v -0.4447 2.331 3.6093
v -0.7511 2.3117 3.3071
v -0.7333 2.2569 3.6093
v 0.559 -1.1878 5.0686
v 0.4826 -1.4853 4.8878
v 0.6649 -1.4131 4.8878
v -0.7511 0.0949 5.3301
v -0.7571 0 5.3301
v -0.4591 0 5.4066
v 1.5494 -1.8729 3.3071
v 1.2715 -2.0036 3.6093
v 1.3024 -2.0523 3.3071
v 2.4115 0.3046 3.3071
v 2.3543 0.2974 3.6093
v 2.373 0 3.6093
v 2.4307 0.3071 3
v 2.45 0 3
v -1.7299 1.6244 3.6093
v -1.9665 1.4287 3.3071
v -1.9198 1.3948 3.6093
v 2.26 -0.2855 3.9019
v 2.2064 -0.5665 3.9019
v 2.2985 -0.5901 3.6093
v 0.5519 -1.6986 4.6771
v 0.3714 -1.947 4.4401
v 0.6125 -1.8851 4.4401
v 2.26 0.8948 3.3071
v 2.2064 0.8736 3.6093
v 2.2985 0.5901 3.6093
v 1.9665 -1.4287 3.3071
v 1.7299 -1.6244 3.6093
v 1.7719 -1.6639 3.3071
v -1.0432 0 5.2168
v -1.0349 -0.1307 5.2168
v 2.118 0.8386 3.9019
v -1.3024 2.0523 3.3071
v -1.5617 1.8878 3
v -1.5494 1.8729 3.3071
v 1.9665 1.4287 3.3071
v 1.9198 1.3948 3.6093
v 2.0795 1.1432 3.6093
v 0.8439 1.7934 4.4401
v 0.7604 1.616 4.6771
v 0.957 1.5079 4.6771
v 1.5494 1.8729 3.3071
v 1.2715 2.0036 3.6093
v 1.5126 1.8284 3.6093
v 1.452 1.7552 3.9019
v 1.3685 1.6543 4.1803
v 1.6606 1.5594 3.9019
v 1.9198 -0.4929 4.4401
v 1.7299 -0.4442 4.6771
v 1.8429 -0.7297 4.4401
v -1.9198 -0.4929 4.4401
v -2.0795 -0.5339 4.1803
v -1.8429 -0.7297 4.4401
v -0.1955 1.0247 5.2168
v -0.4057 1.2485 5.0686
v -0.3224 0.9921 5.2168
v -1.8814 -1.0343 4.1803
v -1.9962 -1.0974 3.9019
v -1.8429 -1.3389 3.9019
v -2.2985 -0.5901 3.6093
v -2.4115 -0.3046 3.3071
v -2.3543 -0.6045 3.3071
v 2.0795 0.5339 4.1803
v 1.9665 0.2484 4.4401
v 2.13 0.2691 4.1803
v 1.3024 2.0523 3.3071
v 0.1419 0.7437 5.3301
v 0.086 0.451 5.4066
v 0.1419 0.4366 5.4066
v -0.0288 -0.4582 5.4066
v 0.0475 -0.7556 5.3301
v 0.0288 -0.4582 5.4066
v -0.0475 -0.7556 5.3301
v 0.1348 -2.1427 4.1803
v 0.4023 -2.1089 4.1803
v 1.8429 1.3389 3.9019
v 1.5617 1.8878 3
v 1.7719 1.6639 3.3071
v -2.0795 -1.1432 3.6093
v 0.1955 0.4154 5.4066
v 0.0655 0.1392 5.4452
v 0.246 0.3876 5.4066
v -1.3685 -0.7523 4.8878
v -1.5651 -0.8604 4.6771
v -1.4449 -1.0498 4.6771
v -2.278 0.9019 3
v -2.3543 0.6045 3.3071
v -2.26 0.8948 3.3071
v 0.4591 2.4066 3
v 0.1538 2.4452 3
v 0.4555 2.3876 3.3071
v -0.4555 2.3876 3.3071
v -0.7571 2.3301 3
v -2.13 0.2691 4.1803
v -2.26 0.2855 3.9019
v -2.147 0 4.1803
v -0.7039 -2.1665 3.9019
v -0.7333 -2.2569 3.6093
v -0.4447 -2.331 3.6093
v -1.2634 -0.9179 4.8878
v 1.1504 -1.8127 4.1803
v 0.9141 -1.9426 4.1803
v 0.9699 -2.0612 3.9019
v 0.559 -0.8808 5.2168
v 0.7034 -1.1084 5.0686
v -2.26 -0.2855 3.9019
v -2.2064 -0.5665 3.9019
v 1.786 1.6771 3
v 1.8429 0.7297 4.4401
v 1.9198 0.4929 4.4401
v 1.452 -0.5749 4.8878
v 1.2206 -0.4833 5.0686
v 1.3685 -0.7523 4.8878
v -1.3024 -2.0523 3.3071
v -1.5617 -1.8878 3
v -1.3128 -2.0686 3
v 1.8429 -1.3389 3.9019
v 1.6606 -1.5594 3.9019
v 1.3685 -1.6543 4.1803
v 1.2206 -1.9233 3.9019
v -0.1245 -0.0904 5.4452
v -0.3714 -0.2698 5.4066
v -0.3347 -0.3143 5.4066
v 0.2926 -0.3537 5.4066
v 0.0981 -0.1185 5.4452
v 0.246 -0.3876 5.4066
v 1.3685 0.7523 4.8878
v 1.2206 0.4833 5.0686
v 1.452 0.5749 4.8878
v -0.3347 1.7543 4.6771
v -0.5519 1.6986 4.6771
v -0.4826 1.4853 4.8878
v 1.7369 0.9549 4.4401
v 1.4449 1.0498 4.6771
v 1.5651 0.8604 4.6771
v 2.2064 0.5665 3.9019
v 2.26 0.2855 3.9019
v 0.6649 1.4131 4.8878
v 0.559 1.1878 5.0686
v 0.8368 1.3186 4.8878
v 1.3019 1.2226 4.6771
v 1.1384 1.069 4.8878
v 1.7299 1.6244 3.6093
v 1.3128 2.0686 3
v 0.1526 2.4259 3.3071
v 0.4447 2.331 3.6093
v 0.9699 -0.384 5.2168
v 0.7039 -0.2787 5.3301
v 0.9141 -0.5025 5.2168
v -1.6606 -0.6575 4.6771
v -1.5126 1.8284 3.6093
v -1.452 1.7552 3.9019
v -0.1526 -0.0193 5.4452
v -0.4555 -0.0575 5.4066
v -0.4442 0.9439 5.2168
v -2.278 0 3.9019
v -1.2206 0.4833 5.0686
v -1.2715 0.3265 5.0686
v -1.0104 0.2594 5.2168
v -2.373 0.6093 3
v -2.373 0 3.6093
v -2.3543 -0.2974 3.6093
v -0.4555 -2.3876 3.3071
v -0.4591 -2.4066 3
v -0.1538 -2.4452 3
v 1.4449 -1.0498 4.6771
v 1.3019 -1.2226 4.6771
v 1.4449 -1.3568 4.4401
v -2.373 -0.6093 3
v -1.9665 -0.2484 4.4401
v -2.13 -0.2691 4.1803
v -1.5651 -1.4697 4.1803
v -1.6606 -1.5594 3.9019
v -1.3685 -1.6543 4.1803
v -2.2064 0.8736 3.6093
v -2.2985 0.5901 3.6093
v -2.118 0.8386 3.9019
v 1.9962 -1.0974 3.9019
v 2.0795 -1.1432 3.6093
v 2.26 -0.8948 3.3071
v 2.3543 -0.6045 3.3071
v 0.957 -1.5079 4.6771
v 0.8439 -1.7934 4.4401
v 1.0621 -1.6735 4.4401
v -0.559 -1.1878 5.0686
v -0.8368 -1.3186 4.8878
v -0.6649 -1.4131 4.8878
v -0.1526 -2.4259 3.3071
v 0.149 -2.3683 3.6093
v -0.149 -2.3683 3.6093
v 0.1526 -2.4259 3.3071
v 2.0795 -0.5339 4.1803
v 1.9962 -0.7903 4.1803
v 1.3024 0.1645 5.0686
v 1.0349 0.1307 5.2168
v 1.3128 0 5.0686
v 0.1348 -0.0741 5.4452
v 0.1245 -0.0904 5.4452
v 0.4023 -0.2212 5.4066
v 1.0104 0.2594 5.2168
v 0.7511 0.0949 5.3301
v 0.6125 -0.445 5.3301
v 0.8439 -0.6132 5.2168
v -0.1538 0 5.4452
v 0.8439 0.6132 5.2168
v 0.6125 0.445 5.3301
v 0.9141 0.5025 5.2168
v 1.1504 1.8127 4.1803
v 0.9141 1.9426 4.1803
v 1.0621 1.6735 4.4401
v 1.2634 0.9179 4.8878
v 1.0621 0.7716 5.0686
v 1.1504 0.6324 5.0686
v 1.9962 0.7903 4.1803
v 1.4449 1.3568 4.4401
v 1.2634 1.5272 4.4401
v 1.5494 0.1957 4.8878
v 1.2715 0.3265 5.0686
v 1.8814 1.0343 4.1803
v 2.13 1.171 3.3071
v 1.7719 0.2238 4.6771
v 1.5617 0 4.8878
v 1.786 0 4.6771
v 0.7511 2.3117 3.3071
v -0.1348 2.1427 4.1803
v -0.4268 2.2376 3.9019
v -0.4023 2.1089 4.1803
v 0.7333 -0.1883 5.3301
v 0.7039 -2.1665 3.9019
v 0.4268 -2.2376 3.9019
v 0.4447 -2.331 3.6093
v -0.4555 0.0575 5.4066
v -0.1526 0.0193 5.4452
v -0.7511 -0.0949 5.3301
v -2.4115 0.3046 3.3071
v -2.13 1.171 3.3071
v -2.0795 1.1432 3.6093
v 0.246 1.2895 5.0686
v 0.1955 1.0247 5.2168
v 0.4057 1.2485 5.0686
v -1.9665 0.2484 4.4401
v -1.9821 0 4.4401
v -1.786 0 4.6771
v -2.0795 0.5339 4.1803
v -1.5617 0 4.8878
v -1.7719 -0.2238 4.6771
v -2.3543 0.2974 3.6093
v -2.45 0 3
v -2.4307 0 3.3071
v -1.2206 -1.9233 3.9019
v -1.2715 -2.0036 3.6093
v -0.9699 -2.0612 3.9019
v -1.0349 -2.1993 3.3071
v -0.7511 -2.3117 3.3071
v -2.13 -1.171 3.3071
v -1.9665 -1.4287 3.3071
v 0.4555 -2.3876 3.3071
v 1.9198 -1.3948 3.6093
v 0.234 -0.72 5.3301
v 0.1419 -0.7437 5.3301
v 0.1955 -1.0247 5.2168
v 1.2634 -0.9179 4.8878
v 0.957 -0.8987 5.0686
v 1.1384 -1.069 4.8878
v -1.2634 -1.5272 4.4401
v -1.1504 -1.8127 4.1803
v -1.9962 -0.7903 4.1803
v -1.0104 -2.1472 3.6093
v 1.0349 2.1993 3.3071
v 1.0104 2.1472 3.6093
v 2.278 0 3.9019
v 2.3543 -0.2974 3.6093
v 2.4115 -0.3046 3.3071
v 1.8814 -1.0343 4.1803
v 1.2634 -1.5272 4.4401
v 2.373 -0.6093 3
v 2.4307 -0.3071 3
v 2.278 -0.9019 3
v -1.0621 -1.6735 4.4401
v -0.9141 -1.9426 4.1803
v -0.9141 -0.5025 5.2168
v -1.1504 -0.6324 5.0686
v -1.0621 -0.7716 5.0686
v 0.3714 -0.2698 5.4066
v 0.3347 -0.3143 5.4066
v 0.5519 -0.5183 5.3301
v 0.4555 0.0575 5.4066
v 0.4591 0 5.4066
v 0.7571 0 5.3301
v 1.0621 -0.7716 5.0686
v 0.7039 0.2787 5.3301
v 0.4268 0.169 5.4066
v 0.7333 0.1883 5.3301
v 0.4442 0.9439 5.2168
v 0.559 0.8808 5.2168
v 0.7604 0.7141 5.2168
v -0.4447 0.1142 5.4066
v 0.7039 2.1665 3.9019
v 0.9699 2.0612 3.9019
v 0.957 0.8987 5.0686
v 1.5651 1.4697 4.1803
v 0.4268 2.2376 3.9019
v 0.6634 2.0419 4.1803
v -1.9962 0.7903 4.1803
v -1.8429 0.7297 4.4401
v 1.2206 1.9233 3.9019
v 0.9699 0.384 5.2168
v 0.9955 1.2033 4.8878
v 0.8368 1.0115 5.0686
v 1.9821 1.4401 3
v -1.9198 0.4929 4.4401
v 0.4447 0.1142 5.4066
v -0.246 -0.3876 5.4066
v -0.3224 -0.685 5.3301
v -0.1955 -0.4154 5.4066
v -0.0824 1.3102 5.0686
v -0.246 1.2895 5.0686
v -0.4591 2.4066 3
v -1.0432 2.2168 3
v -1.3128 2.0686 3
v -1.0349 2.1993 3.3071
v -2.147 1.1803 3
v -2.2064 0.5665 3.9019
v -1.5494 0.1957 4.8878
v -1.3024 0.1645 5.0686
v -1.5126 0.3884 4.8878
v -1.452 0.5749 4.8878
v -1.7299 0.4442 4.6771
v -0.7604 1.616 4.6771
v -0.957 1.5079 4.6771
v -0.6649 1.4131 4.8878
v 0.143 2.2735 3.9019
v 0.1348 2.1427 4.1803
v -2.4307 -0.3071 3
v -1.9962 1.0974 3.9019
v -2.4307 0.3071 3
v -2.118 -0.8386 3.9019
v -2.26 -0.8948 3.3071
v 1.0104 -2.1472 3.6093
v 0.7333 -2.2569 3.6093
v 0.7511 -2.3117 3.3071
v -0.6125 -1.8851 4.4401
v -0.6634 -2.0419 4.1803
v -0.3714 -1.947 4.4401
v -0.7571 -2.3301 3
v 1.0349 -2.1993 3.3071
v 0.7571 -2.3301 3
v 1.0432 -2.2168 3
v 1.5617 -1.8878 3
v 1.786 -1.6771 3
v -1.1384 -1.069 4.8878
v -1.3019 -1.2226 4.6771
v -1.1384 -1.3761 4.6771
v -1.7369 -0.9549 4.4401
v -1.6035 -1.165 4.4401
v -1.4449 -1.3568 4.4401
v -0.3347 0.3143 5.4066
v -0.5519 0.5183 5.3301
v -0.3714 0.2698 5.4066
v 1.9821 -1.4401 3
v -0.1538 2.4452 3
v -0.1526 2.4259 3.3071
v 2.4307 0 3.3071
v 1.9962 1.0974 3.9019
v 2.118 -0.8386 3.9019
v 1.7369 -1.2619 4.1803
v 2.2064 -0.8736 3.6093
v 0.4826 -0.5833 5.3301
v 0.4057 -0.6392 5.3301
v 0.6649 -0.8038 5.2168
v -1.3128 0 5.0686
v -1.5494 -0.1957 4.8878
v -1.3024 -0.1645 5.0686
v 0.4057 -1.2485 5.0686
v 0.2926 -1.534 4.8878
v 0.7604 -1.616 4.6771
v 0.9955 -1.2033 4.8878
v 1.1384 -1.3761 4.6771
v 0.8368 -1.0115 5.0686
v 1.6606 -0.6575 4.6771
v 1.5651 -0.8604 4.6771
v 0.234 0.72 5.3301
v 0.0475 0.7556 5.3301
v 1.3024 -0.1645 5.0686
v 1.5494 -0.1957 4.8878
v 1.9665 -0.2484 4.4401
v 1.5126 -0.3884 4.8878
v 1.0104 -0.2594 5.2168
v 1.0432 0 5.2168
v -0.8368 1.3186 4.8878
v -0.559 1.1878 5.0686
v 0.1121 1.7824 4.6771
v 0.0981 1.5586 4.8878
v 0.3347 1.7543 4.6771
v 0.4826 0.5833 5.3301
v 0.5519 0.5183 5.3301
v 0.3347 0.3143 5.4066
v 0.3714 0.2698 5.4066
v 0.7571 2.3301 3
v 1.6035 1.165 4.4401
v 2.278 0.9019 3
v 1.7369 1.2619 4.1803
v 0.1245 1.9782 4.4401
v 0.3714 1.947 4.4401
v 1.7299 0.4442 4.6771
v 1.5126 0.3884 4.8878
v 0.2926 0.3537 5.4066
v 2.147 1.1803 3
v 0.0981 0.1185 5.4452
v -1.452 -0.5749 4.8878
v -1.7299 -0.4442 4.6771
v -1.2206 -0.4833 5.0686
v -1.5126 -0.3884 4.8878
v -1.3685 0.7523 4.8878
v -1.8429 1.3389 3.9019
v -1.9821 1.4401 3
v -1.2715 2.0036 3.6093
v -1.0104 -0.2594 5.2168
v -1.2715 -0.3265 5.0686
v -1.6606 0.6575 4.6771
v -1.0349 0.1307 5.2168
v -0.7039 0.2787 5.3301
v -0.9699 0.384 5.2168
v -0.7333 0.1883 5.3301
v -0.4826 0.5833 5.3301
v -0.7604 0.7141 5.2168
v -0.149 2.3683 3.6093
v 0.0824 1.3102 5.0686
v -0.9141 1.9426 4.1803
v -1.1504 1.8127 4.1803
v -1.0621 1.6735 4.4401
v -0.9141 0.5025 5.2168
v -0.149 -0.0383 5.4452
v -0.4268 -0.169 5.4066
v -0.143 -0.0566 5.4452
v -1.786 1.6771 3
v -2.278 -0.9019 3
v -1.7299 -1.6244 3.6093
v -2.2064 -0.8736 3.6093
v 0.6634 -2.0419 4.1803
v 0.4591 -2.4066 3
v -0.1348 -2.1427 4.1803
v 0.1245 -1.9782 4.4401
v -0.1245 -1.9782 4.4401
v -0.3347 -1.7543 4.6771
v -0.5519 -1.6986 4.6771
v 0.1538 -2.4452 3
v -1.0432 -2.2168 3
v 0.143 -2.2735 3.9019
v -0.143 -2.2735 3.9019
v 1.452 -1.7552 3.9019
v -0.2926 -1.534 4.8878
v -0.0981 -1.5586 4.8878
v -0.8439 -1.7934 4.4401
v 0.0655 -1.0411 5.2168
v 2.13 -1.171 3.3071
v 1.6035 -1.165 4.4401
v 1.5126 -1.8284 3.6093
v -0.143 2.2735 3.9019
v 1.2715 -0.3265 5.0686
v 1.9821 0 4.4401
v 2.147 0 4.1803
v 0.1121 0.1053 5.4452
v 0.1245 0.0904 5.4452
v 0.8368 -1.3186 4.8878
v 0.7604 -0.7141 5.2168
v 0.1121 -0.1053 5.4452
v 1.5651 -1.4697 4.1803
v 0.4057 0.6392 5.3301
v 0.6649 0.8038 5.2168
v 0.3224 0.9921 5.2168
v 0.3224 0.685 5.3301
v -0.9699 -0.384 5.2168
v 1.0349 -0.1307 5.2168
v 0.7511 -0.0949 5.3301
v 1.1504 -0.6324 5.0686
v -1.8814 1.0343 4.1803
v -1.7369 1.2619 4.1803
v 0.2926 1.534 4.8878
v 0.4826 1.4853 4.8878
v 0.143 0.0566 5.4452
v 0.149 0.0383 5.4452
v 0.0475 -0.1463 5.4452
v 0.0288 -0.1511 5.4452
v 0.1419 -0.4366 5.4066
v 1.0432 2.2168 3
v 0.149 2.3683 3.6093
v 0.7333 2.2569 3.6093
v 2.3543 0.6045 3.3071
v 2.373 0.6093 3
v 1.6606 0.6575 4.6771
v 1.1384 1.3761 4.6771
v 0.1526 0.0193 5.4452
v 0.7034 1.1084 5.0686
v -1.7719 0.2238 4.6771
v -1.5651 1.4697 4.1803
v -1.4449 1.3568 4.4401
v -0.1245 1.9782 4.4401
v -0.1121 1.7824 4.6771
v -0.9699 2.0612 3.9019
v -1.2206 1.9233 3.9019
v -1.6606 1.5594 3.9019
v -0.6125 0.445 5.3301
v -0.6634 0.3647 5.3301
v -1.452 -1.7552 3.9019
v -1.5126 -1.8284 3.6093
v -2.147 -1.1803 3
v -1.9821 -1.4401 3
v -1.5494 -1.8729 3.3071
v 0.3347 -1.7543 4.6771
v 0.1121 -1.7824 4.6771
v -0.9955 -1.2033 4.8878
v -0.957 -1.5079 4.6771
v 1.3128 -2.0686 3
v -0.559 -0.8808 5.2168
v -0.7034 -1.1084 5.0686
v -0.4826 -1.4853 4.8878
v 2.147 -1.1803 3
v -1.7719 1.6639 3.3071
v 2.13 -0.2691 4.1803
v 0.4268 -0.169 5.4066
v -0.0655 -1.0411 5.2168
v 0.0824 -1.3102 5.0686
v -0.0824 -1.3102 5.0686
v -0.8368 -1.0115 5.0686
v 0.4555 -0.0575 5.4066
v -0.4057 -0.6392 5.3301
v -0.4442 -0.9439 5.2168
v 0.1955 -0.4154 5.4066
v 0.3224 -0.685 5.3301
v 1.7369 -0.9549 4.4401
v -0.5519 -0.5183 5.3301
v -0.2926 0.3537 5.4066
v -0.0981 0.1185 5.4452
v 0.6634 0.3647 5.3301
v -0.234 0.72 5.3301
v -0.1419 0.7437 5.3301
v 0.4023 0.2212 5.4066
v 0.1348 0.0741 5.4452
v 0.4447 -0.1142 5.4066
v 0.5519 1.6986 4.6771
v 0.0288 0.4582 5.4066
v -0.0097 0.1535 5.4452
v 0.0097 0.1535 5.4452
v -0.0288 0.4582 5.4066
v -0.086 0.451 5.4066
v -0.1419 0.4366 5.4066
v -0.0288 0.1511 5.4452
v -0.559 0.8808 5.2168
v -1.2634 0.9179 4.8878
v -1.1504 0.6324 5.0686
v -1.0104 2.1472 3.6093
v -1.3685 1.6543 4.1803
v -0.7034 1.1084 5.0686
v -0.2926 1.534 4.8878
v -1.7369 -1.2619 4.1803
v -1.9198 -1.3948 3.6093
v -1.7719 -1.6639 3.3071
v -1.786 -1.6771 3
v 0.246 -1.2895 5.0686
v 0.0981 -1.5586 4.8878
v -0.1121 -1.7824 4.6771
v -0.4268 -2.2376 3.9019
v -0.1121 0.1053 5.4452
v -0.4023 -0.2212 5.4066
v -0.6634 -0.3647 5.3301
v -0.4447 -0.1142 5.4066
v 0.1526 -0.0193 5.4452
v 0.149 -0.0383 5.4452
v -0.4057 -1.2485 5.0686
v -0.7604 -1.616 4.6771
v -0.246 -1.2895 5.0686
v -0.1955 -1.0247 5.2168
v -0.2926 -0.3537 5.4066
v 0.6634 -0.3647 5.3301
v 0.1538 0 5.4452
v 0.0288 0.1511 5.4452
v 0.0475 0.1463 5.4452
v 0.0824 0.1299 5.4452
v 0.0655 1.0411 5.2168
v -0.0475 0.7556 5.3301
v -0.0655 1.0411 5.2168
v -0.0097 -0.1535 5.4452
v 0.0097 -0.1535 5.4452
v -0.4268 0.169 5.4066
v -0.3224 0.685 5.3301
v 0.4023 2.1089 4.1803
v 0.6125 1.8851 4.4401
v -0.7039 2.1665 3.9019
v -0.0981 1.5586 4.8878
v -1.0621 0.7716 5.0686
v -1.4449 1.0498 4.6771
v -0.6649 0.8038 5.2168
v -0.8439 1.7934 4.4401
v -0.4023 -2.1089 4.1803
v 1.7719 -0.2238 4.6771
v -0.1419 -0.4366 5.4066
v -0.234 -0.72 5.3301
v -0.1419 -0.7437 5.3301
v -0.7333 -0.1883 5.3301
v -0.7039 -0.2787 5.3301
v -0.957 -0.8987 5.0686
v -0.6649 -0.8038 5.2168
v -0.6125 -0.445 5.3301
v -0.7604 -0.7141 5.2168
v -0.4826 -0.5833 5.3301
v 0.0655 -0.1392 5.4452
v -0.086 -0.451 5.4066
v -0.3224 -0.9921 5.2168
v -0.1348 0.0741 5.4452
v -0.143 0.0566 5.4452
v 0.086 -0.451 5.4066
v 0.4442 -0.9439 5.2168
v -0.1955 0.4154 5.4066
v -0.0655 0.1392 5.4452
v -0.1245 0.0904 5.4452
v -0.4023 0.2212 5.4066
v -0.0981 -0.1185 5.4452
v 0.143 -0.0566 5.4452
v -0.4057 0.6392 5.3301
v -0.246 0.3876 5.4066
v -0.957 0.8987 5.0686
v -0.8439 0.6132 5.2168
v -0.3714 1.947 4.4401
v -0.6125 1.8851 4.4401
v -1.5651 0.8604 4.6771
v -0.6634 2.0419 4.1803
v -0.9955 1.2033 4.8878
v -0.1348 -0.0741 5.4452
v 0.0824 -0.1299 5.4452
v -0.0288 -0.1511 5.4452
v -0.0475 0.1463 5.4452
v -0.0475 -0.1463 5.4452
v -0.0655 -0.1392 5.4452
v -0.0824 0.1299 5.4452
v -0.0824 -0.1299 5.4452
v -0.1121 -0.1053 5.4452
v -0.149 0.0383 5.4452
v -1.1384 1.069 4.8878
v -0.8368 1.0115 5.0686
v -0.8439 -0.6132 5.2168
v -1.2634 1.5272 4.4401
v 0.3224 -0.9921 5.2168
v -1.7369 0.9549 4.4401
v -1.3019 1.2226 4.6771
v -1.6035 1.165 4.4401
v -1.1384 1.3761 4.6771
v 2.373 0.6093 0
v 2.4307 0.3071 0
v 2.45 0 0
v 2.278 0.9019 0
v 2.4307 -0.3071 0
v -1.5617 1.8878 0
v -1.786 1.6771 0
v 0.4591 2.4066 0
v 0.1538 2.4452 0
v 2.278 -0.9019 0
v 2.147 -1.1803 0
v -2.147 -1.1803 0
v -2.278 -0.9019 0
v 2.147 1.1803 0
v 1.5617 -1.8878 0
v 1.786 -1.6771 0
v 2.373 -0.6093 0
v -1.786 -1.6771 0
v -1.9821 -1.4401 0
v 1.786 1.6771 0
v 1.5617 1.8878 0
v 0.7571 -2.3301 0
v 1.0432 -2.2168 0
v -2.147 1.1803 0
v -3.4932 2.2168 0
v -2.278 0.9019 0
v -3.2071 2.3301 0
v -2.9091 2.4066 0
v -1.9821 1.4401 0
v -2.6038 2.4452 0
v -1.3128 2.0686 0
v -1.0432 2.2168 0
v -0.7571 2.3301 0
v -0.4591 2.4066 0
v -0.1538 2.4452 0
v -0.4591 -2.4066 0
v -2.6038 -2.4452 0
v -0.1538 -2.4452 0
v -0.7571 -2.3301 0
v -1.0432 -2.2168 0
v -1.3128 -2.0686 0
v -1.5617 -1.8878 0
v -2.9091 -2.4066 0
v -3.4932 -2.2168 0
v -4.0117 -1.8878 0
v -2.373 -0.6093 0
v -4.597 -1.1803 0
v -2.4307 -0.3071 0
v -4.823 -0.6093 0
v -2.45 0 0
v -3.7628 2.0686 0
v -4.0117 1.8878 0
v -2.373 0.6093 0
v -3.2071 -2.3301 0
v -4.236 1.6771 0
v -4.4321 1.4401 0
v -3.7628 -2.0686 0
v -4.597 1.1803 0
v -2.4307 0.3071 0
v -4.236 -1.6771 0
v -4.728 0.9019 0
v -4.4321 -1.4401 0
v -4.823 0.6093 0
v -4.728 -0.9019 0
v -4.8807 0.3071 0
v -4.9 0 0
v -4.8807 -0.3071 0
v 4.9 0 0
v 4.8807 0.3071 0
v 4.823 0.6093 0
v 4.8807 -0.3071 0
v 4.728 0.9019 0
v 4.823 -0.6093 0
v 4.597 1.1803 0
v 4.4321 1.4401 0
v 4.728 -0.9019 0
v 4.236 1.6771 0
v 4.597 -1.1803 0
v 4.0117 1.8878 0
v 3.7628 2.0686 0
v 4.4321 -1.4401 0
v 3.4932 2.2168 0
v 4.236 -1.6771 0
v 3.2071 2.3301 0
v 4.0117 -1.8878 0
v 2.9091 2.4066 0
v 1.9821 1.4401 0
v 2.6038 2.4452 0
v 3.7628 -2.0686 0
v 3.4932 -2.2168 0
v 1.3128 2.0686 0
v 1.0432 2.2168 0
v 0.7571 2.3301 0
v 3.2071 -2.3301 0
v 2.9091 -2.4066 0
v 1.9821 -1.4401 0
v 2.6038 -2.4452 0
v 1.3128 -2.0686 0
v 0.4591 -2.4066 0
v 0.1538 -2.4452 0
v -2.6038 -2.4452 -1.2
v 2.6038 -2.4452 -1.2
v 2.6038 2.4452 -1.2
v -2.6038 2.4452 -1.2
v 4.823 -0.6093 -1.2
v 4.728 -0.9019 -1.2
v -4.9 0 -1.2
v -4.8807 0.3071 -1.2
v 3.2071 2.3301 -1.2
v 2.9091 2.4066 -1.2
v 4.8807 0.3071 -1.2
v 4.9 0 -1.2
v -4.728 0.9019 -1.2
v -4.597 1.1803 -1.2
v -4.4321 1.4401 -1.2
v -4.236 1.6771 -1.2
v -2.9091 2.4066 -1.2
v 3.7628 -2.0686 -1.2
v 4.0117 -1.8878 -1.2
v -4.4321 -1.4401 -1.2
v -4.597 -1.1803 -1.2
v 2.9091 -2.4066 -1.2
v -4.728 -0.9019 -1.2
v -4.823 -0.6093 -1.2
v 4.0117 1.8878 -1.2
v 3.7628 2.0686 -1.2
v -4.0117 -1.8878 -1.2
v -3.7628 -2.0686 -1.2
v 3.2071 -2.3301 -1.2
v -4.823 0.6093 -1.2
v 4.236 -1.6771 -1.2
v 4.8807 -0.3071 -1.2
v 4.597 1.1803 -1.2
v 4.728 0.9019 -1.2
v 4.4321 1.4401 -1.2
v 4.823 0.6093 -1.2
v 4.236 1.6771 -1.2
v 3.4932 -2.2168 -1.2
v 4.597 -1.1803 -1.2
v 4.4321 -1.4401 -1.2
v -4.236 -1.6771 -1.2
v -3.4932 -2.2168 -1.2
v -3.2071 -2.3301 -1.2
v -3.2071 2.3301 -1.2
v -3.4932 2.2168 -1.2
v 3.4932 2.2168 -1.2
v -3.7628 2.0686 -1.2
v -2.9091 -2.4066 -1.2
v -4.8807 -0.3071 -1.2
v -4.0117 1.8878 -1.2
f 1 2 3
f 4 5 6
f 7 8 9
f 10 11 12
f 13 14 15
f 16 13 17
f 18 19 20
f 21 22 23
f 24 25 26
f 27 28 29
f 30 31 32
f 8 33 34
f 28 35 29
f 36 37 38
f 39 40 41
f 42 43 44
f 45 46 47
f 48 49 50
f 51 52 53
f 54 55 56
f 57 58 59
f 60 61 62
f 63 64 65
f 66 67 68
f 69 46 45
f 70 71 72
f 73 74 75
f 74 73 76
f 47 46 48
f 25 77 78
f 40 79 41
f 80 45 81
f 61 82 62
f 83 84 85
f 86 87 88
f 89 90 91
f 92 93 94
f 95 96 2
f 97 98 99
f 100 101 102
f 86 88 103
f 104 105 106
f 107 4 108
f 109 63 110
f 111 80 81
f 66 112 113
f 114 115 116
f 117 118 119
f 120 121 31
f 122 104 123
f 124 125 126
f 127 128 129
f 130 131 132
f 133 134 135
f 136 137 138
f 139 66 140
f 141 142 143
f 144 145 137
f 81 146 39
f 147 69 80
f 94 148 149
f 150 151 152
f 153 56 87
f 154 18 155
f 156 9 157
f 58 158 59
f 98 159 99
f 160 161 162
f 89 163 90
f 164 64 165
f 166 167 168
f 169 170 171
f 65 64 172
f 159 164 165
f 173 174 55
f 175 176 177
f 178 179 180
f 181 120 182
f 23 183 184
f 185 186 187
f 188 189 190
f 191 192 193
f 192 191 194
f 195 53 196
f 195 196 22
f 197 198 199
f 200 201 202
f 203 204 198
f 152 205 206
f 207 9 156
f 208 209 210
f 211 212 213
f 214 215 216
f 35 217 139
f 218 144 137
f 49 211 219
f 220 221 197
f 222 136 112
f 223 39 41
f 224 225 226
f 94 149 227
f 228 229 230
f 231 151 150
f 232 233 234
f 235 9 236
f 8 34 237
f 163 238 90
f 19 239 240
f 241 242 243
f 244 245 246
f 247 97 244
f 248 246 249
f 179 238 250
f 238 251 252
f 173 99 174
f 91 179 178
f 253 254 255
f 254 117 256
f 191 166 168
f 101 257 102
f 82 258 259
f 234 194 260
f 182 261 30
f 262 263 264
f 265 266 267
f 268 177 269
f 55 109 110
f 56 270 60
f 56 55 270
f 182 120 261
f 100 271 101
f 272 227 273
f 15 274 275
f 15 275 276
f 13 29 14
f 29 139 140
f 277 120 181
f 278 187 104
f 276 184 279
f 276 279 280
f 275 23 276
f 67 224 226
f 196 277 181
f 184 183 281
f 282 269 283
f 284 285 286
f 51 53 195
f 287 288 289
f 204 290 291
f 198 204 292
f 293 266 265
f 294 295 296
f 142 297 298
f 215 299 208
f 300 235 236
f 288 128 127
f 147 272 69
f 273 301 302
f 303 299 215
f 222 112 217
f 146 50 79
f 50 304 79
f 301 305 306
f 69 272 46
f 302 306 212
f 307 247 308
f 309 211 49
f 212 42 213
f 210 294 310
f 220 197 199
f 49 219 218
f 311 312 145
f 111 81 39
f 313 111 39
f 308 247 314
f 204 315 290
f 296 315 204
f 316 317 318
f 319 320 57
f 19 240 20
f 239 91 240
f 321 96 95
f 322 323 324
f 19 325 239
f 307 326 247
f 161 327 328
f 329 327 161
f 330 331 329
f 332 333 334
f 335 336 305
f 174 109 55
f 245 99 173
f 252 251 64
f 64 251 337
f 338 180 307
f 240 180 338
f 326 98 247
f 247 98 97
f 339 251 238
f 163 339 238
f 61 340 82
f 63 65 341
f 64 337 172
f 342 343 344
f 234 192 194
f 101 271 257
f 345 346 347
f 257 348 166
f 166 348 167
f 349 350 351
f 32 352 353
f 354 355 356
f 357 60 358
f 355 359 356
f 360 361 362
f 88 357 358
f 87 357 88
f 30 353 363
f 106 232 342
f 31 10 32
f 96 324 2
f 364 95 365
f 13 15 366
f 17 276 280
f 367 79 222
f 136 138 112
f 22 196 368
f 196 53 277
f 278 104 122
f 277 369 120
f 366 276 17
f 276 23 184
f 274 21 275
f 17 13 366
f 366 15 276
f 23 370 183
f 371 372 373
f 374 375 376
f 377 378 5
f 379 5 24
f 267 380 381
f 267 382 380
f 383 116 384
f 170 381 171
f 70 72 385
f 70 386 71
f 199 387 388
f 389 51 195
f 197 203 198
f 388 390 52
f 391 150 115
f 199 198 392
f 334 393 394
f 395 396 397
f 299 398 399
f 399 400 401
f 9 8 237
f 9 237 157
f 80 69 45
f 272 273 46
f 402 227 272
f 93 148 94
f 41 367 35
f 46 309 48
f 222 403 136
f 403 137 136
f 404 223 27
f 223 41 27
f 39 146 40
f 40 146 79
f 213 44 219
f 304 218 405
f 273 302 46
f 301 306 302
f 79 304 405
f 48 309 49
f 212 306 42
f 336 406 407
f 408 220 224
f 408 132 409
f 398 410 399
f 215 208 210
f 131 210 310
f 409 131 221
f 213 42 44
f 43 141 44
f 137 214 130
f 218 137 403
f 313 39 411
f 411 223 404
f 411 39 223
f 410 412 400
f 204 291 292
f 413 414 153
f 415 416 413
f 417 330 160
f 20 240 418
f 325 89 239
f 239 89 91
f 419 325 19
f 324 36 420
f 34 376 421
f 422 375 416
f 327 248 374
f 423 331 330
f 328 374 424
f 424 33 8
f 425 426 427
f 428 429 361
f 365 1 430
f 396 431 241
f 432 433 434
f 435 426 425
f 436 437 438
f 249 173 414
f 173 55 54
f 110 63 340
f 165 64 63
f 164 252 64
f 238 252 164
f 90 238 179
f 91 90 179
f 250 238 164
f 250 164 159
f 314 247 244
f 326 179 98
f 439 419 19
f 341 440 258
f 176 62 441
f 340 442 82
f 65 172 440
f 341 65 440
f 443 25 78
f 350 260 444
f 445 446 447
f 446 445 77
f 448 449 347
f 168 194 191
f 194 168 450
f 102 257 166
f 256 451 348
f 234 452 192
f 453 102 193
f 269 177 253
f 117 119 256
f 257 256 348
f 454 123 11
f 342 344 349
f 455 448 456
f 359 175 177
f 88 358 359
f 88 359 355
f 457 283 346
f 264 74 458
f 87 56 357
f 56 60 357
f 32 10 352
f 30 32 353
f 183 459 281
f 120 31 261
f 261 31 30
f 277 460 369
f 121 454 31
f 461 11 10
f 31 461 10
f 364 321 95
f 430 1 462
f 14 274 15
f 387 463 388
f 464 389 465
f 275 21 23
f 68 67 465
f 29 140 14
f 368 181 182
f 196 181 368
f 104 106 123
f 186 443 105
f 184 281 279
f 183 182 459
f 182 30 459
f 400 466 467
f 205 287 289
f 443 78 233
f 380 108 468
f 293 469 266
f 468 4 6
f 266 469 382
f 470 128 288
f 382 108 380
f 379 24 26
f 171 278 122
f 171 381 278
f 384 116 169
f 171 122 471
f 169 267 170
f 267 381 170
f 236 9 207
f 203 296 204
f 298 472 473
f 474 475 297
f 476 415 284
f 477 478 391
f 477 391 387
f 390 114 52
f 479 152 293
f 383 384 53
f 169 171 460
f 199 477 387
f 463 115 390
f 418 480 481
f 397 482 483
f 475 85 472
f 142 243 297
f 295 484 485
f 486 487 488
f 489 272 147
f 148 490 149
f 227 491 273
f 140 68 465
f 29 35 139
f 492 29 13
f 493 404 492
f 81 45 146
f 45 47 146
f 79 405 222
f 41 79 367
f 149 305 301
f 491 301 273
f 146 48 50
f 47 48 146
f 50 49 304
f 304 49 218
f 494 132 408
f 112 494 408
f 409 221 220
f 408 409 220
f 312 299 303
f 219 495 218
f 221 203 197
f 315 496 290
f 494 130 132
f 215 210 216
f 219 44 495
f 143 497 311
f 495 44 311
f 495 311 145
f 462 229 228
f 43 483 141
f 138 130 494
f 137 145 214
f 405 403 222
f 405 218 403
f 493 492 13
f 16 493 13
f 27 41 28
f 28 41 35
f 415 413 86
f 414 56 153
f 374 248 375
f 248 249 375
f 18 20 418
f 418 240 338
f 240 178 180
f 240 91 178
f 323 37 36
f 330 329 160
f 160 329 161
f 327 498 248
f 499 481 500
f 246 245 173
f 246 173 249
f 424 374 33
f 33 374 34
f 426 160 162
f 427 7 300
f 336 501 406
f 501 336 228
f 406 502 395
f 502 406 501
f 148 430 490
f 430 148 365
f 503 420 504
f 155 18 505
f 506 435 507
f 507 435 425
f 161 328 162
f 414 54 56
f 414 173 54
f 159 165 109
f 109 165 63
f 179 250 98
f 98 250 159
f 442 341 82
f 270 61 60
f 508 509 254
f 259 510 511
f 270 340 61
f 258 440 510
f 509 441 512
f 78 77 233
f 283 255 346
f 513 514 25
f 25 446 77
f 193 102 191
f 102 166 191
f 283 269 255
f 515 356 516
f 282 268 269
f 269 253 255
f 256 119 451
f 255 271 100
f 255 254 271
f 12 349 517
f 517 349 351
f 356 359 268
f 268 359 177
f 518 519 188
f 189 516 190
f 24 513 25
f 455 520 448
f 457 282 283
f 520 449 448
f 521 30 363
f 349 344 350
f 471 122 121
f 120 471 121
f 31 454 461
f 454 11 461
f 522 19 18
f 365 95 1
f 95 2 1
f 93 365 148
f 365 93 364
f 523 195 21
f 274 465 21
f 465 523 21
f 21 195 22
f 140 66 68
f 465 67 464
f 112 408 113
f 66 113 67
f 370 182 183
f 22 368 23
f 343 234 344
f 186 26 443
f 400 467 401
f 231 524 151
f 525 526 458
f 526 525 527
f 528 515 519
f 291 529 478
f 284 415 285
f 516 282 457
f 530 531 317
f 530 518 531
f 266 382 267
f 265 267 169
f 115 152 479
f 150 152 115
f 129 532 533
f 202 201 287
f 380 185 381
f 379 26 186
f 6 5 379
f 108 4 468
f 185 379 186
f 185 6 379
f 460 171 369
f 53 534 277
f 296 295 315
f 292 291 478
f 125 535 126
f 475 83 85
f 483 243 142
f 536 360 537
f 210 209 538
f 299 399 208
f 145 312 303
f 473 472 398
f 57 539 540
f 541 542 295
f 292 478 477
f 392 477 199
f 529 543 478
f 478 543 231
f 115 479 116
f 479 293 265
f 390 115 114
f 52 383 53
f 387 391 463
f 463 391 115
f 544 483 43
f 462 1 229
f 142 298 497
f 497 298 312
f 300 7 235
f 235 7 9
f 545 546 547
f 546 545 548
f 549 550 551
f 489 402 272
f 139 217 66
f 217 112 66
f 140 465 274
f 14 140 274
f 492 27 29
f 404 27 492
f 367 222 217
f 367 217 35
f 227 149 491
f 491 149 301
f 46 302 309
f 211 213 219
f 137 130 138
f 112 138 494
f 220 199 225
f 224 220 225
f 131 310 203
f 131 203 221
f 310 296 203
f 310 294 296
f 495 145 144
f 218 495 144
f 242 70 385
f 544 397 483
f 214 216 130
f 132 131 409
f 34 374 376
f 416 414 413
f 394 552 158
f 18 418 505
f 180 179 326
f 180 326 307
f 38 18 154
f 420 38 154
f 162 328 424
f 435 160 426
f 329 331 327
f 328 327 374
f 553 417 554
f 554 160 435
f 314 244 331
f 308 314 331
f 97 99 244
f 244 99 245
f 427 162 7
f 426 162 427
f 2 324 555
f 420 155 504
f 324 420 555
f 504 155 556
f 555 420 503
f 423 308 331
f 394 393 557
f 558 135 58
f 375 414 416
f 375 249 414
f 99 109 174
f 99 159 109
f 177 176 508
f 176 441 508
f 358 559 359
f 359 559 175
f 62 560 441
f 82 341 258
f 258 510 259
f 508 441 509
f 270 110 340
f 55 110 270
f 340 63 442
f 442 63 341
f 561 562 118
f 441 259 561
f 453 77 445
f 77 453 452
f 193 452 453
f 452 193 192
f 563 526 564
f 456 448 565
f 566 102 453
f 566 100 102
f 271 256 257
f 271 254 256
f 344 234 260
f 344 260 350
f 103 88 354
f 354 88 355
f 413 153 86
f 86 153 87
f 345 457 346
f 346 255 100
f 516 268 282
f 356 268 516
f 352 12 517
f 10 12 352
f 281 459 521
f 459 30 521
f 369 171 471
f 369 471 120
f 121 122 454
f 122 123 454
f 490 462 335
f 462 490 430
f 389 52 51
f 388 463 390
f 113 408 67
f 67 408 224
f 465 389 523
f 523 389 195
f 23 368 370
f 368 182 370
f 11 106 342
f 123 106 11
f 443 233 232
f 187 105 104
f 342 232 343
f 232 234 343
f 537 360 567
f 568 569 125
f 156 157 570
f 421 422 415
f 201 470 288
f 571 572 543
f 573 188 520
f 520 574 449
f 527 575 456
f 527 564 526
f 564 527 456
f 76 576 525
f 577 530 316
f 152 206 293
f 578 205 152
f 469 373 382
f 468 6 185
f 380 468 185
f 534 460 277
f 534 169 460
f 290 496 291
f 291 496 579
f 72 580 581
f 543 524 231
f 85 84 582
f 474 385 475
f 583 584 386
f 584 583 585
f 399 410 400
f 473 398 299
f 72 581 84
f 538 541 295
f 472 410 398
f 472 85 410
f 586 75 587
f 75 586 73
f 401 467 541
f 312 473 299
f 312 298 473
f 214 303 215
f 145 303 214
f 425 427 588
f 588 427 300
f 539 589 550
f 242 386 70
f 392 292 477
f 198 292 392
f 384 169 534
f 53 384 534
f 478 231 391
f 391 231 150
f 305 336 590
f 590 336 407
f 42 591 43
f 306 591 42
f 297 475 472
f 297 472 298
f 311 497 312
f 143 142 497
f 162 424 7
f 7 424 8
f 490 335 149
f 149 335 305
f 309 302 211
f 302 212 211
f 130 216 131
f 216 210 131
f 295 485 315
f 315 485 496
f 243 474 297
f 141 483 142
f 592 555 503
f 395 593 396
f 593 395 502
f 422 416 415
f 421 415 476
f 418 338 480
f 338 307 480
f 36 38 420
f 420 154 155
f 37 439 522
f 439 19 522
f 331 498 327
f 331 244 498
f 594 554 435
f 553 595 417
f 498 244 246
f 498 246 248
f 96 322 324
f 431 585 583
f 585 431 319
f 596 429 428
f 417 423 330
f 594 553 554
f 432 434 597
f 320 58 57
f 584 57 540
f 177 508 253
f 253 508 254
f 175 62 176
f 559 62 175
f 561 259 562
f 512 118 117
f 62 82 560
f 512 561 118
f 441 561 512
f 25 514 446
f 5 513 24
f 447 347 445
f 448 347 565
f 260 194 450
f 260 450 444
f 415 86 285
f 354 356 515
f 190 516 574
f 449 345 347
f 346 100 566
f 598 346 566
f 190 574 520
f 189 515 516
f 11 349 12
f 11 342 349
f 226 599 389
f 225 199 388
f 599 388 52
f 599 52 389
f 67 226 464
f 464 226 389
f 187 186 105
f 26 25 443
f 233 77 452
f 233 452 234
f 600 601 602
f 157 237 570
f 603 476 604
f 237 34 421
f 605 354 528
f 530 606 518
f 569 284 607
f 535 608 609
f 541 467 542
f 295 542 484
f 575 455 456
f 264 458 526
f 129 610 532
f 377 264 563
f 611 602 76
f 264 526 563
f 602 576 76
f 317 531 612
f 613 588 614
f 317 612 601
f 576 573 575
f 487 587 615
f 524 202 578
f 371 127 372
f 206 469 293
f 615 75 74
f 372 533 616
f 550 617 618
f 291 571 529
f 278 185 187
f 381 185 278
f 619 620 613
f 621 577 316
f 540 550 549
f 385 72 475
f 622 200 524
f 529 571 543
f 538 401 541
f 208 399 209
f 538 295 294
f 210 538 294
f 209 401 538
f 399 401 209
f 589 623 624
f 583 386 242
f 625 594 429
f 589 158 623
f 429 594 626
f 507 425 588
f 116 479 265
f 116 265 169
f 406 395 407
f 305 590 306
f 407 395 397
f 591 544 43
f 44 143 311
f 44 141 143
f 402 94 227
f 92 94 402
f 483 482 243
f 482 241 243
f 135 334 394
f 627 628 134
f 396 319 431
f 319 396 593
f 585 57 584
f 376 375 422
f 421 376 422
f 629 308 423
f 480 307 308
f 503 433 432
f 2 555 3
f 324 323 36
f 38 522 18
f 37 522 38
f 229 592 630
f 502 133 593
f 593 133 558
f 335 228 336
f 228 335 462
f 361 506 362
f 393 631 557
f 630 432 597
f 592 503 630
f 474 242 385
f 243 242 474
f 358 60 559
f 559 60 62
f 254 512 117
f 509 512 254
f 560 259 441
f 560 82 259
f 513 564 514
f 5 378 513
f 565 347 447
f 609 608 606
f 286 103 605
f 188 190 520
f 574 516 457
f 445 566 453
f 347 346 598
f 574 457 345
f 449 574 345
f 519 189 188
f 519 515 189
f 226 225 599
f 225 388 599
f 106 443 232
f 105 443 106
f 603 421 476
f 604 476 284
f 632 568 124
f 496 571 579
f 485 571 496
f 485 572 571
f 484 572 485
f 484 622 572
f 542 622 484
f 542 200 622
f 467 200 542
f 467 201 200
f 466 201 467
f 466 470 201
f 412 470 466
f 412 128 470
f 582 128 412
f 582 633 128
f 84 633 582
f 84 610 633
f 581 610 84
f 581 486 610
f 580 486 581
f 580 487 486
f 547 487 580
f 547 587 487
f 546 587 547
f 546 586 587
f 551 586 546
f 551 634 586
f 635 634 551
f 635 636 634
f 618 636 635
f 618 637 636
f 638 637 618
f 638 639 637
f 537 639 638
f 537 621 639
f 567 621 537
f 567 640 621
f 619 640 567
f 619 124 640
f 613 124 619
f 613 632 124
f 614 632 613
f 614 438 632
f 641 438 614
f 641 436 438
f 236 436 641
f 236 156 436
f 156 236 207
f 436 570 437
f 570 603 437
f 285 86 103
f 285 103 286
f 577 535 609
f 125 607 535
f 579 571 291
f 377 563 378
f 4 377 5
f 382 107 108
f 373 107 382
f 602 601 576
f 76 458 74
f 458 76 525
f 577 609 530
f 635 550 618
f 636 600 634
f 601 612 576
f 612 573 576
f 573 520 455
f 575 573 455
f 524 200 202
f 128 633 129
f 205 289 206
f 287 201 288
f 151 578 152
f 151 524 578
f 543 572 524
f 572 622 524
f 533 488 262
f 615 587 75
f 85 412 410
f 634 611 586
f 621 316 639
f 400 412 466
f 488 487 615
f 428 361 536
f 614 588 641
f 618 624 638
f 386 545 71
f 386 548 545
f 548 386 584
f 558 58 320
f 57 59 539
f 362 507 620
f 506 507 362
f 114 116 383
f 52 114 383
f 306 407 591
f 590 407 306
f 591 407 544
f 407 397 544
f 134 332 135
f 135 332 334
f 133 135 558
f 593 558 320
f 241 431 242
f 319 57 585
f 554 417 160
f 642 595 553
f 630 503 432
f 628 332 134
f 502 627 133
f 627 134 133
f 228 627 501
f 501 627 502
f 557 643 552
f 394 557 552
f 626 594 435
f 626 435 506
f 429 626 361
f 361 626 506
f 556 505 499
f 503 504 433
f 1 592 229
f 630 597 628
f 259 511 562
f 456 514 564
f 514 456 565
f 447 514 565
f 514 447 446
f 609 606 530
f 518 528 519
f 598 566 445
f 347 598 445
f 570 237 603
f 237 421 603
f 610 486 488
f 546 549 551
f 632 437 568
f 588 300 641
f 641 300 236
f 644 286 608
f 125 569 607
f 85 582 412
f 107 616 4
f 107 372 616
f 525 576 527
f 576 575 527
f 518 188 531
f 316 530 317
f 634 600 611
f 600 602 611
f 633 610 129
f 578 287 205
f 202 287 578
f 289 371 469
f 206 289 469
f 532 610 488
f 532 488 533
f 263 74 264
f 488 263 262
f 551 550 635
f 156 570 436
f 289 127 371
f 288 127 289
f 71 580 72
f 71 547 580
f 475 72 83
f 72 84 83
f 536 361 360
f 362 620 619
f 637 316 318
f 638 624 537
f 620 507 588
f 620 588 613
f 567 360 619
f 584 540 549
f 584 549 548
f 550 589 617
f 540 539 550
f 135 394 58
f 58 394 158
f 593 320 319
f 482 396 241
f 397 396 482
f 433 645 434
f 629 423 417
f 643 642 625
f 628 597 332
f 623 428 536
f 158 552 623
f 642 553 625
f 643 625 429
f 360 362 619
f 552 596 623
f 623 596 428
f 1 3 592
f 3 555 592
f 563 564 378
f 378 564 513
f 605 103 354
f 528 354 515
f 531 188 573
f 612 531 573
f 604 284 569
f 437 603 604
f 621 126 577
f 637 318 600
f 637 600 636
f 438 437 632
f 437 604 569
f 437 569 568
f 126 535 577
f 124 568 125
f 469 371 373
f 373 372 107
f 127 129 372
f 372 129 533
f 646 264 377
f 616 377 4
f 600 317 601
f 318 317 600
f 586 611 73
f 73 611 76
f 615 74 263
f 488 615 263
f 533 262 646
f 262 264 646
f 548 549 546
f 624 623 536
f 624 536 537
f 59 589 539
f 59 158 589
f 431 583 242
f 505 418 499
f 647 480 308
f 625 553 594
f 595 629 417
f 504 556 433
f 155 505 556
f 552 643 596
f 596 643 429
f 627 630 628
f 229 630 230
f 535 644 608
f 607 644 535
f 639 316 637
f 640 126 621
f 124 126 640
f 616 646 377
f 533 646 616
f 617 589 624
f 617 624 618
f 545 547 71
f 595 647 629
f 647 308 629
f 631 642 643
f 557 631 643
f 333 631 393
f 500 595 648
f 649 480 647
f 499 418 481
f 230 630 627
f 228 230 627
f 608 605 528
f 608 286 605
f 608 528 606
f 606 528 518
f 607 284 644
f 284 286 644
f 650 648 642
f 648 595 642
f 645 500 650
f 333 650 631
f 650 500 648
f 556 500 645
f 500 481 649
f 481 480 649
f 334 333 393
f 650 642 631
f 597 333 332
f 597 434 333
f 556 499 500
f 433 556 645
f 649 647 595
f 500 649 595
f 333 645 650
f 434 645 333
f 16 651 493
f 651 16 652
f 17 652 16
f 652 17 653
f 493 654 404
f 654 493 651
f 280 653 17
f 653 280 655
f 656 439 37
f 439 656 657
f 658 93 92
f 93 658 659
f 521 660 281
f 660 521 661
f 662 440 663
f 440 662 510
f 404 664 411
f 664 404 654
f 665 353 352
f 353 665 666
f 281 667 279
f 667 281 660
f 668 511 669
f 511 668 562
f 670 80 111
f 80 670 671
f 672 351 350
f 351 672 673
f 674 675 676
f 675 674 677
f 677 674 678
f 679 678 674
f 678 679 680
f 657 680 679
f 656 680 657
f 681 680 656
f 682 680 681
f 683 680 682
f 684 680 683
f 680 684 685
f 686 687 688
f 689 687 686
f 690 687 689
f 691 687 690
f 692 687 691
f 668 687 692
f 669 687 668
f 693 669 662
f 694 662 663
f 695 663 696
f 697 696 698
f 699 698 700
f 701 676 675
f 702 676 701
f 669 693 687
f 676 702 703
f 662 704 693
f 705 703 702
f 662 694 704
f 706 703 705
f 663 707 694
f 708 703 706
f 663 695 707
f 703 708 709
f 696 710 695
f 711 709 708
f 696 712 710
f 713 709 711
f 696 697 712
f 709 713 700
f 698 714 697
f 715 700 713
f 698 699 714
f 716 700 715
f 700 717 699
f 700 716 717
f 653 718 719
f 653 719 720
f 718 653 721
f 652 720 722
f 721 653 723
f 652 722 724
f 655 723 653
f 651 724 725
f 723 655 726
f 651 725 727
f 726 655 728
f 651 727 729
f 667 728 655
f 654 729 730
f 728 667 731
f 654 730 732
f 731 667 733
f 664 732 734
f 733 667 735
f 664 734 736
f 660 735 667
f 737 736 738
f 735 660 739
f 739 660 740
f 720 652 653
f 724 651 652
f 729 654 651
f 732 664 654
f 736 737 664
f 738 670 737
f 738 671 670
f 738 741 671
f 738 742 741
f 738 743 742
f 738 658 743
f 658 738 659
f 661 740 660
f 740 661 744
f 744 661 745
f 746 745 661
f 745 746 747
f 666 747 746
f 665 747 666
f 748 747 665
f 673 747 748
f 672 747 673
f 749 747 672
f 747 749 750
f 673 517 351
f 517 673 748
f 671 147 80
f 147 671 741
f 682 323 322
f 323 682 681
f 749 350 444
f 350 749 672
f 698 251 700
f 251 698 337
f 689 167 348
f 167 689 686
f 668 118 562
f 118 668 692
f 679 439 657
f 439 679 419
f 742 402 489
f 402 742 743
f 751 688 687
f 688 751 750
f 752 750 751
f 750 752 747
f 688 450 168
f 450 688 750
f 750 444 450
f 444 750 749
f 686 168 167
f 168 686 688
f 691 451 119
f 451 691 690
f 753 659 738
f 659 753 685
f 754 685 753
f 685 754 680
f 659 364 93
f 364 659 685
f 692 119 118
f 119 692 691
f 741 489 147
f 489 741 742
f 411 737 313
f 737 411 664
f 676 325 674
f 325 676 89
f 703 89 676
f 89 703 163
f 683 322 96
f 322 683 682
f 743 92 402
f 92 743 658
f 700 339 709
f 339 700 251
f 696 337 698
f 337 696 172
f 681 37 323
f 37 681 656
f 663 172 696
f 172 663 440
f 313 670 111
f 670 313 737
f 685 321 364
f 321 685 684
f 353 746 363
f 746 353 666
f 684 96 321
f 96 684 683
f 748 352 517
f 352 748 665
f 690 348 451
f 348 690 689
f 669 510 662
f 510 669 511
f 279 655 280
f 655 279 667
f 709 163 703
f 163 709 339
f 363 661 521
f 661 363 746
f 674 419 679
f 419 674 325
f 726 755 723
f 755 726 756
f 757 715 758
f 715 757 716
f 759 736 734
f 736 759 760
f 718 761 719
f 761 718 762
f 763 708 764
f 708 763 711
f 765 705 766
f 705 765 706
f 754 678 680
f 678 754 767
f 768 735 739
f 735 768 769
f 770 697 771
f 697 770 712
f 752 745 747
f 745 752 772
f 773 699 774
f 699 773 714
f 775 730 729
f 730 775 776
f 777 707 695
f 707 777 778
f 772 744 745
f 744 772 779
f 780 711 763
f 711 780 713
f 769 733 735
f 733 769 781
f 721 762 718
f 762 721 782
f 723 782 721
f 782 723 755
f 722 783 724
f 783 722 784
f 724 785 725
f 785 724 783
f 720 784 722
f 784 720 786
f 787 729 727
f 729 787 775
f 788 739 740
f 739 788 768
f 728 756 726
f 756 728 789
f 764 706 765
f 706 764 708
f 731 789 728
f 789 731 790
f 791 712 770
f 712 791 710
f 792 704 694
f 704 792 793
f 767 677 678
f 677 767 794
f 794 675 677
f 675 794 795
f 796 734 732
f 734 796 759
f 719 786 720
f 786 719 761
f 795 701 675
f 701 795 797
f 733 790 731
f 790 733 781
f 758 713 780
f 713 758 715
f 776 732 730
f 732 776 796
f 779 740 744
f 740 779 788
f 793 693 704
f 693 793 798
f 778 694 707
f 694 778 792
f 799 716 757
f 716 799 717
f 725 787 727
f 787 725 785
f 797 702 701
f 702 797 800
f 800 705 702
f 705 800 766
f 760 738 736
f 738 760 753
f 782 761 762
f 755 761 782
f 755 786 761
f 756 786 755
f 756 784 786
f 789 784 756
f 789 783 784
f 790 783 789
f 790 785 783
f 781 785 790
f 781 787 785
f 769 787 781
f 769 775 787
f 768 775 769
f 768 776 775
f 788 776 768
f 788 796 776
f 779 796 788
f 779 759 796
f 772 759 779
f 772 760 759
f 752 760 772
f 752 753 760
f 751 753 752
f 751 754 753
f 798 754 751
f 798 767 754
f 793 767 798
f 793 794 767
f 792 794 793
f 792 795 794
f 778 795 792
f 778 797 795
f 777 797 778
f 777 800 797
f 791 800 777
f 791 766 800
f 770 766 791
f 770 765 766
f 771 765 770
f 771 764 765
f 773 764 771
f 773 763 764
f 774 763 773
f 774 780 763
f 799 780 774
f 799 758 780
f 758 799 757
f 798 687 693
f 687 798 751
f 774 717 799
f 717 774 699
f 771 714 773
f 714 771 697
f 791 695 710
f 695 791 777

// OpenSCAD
// file: ../shared/common.scad
// extra space, so difference() operations in 3D are rendered without
// z-fighting in the OpenSCAD preview
dif = 1;

// sometimes a large value is needed to cut certain regions
max_value = 100000;

// Acute angle between horizon and part. The smallest angle the printer
// can handle without supports.
printer_max_overhang_degrees = 55;

clearance_fit = 0.1;
clearance_medium = 0.2;
clearance_loose = 0.4;

module screw_hole_2d(d, clearance=0) {
    hole_d = d + 2*clearance;
    circle(d = hole_d);
}

module cylinder_slice(r, h, a){
    rotate_extrude(angle=a) {
        square([r, h]);
    }
}

module closing(r) {
    offset(-r) {
        offset(r) {
            children();
        }
    }
}

module opening(r) {
    offset(r) {
        offset(-r) {
            children();
        }
    }
}

// For 2D round chamfers, see https://forum.openscad.org/how-to-make-round-chamfer-at-2D-object-tp19714p19799.html
module round_chamfer(r=0, delta=0, chamfer=false, keep_size = false) {
    if (keep_size) {
        offset(r)
            offset(-r)
                offset(-r)
                    offset(r)
                        children();
    } else {
        offset(r = r, chamfer = chamfer)
            children();
    }
}
// main file
include <../shared/common.scad>

$fn = 50;

// looks like a 5mm, but is more 5.1
hook_hole_d = 5.1;
hook_wall = 2;

pin_base_thickness = 1.2;
pin_base_x = 2 * hook_hole_d;
pin_d = hook_hole_d - 2*clearance_fit;
pin_z = 1.5 * hook_wall + pin_d / 2;

// pin section
union() {
    translate([0, 0, pin_z - pin_d / 2])
        sphere(d = pin_d);

    cylinder(h=pin_z - pin_d / 2, d = pin_d);
}

// base section
translate([0, 0, -pin_base_thickness])
    linear_extrude(height=pin_base_thickness)
        hull() {
            translate([-pin_d / 2, 0])
                circle(d=pin_d);
            translate([+pin_d / 2, 0])
                circle(d=pin_d);
        }
